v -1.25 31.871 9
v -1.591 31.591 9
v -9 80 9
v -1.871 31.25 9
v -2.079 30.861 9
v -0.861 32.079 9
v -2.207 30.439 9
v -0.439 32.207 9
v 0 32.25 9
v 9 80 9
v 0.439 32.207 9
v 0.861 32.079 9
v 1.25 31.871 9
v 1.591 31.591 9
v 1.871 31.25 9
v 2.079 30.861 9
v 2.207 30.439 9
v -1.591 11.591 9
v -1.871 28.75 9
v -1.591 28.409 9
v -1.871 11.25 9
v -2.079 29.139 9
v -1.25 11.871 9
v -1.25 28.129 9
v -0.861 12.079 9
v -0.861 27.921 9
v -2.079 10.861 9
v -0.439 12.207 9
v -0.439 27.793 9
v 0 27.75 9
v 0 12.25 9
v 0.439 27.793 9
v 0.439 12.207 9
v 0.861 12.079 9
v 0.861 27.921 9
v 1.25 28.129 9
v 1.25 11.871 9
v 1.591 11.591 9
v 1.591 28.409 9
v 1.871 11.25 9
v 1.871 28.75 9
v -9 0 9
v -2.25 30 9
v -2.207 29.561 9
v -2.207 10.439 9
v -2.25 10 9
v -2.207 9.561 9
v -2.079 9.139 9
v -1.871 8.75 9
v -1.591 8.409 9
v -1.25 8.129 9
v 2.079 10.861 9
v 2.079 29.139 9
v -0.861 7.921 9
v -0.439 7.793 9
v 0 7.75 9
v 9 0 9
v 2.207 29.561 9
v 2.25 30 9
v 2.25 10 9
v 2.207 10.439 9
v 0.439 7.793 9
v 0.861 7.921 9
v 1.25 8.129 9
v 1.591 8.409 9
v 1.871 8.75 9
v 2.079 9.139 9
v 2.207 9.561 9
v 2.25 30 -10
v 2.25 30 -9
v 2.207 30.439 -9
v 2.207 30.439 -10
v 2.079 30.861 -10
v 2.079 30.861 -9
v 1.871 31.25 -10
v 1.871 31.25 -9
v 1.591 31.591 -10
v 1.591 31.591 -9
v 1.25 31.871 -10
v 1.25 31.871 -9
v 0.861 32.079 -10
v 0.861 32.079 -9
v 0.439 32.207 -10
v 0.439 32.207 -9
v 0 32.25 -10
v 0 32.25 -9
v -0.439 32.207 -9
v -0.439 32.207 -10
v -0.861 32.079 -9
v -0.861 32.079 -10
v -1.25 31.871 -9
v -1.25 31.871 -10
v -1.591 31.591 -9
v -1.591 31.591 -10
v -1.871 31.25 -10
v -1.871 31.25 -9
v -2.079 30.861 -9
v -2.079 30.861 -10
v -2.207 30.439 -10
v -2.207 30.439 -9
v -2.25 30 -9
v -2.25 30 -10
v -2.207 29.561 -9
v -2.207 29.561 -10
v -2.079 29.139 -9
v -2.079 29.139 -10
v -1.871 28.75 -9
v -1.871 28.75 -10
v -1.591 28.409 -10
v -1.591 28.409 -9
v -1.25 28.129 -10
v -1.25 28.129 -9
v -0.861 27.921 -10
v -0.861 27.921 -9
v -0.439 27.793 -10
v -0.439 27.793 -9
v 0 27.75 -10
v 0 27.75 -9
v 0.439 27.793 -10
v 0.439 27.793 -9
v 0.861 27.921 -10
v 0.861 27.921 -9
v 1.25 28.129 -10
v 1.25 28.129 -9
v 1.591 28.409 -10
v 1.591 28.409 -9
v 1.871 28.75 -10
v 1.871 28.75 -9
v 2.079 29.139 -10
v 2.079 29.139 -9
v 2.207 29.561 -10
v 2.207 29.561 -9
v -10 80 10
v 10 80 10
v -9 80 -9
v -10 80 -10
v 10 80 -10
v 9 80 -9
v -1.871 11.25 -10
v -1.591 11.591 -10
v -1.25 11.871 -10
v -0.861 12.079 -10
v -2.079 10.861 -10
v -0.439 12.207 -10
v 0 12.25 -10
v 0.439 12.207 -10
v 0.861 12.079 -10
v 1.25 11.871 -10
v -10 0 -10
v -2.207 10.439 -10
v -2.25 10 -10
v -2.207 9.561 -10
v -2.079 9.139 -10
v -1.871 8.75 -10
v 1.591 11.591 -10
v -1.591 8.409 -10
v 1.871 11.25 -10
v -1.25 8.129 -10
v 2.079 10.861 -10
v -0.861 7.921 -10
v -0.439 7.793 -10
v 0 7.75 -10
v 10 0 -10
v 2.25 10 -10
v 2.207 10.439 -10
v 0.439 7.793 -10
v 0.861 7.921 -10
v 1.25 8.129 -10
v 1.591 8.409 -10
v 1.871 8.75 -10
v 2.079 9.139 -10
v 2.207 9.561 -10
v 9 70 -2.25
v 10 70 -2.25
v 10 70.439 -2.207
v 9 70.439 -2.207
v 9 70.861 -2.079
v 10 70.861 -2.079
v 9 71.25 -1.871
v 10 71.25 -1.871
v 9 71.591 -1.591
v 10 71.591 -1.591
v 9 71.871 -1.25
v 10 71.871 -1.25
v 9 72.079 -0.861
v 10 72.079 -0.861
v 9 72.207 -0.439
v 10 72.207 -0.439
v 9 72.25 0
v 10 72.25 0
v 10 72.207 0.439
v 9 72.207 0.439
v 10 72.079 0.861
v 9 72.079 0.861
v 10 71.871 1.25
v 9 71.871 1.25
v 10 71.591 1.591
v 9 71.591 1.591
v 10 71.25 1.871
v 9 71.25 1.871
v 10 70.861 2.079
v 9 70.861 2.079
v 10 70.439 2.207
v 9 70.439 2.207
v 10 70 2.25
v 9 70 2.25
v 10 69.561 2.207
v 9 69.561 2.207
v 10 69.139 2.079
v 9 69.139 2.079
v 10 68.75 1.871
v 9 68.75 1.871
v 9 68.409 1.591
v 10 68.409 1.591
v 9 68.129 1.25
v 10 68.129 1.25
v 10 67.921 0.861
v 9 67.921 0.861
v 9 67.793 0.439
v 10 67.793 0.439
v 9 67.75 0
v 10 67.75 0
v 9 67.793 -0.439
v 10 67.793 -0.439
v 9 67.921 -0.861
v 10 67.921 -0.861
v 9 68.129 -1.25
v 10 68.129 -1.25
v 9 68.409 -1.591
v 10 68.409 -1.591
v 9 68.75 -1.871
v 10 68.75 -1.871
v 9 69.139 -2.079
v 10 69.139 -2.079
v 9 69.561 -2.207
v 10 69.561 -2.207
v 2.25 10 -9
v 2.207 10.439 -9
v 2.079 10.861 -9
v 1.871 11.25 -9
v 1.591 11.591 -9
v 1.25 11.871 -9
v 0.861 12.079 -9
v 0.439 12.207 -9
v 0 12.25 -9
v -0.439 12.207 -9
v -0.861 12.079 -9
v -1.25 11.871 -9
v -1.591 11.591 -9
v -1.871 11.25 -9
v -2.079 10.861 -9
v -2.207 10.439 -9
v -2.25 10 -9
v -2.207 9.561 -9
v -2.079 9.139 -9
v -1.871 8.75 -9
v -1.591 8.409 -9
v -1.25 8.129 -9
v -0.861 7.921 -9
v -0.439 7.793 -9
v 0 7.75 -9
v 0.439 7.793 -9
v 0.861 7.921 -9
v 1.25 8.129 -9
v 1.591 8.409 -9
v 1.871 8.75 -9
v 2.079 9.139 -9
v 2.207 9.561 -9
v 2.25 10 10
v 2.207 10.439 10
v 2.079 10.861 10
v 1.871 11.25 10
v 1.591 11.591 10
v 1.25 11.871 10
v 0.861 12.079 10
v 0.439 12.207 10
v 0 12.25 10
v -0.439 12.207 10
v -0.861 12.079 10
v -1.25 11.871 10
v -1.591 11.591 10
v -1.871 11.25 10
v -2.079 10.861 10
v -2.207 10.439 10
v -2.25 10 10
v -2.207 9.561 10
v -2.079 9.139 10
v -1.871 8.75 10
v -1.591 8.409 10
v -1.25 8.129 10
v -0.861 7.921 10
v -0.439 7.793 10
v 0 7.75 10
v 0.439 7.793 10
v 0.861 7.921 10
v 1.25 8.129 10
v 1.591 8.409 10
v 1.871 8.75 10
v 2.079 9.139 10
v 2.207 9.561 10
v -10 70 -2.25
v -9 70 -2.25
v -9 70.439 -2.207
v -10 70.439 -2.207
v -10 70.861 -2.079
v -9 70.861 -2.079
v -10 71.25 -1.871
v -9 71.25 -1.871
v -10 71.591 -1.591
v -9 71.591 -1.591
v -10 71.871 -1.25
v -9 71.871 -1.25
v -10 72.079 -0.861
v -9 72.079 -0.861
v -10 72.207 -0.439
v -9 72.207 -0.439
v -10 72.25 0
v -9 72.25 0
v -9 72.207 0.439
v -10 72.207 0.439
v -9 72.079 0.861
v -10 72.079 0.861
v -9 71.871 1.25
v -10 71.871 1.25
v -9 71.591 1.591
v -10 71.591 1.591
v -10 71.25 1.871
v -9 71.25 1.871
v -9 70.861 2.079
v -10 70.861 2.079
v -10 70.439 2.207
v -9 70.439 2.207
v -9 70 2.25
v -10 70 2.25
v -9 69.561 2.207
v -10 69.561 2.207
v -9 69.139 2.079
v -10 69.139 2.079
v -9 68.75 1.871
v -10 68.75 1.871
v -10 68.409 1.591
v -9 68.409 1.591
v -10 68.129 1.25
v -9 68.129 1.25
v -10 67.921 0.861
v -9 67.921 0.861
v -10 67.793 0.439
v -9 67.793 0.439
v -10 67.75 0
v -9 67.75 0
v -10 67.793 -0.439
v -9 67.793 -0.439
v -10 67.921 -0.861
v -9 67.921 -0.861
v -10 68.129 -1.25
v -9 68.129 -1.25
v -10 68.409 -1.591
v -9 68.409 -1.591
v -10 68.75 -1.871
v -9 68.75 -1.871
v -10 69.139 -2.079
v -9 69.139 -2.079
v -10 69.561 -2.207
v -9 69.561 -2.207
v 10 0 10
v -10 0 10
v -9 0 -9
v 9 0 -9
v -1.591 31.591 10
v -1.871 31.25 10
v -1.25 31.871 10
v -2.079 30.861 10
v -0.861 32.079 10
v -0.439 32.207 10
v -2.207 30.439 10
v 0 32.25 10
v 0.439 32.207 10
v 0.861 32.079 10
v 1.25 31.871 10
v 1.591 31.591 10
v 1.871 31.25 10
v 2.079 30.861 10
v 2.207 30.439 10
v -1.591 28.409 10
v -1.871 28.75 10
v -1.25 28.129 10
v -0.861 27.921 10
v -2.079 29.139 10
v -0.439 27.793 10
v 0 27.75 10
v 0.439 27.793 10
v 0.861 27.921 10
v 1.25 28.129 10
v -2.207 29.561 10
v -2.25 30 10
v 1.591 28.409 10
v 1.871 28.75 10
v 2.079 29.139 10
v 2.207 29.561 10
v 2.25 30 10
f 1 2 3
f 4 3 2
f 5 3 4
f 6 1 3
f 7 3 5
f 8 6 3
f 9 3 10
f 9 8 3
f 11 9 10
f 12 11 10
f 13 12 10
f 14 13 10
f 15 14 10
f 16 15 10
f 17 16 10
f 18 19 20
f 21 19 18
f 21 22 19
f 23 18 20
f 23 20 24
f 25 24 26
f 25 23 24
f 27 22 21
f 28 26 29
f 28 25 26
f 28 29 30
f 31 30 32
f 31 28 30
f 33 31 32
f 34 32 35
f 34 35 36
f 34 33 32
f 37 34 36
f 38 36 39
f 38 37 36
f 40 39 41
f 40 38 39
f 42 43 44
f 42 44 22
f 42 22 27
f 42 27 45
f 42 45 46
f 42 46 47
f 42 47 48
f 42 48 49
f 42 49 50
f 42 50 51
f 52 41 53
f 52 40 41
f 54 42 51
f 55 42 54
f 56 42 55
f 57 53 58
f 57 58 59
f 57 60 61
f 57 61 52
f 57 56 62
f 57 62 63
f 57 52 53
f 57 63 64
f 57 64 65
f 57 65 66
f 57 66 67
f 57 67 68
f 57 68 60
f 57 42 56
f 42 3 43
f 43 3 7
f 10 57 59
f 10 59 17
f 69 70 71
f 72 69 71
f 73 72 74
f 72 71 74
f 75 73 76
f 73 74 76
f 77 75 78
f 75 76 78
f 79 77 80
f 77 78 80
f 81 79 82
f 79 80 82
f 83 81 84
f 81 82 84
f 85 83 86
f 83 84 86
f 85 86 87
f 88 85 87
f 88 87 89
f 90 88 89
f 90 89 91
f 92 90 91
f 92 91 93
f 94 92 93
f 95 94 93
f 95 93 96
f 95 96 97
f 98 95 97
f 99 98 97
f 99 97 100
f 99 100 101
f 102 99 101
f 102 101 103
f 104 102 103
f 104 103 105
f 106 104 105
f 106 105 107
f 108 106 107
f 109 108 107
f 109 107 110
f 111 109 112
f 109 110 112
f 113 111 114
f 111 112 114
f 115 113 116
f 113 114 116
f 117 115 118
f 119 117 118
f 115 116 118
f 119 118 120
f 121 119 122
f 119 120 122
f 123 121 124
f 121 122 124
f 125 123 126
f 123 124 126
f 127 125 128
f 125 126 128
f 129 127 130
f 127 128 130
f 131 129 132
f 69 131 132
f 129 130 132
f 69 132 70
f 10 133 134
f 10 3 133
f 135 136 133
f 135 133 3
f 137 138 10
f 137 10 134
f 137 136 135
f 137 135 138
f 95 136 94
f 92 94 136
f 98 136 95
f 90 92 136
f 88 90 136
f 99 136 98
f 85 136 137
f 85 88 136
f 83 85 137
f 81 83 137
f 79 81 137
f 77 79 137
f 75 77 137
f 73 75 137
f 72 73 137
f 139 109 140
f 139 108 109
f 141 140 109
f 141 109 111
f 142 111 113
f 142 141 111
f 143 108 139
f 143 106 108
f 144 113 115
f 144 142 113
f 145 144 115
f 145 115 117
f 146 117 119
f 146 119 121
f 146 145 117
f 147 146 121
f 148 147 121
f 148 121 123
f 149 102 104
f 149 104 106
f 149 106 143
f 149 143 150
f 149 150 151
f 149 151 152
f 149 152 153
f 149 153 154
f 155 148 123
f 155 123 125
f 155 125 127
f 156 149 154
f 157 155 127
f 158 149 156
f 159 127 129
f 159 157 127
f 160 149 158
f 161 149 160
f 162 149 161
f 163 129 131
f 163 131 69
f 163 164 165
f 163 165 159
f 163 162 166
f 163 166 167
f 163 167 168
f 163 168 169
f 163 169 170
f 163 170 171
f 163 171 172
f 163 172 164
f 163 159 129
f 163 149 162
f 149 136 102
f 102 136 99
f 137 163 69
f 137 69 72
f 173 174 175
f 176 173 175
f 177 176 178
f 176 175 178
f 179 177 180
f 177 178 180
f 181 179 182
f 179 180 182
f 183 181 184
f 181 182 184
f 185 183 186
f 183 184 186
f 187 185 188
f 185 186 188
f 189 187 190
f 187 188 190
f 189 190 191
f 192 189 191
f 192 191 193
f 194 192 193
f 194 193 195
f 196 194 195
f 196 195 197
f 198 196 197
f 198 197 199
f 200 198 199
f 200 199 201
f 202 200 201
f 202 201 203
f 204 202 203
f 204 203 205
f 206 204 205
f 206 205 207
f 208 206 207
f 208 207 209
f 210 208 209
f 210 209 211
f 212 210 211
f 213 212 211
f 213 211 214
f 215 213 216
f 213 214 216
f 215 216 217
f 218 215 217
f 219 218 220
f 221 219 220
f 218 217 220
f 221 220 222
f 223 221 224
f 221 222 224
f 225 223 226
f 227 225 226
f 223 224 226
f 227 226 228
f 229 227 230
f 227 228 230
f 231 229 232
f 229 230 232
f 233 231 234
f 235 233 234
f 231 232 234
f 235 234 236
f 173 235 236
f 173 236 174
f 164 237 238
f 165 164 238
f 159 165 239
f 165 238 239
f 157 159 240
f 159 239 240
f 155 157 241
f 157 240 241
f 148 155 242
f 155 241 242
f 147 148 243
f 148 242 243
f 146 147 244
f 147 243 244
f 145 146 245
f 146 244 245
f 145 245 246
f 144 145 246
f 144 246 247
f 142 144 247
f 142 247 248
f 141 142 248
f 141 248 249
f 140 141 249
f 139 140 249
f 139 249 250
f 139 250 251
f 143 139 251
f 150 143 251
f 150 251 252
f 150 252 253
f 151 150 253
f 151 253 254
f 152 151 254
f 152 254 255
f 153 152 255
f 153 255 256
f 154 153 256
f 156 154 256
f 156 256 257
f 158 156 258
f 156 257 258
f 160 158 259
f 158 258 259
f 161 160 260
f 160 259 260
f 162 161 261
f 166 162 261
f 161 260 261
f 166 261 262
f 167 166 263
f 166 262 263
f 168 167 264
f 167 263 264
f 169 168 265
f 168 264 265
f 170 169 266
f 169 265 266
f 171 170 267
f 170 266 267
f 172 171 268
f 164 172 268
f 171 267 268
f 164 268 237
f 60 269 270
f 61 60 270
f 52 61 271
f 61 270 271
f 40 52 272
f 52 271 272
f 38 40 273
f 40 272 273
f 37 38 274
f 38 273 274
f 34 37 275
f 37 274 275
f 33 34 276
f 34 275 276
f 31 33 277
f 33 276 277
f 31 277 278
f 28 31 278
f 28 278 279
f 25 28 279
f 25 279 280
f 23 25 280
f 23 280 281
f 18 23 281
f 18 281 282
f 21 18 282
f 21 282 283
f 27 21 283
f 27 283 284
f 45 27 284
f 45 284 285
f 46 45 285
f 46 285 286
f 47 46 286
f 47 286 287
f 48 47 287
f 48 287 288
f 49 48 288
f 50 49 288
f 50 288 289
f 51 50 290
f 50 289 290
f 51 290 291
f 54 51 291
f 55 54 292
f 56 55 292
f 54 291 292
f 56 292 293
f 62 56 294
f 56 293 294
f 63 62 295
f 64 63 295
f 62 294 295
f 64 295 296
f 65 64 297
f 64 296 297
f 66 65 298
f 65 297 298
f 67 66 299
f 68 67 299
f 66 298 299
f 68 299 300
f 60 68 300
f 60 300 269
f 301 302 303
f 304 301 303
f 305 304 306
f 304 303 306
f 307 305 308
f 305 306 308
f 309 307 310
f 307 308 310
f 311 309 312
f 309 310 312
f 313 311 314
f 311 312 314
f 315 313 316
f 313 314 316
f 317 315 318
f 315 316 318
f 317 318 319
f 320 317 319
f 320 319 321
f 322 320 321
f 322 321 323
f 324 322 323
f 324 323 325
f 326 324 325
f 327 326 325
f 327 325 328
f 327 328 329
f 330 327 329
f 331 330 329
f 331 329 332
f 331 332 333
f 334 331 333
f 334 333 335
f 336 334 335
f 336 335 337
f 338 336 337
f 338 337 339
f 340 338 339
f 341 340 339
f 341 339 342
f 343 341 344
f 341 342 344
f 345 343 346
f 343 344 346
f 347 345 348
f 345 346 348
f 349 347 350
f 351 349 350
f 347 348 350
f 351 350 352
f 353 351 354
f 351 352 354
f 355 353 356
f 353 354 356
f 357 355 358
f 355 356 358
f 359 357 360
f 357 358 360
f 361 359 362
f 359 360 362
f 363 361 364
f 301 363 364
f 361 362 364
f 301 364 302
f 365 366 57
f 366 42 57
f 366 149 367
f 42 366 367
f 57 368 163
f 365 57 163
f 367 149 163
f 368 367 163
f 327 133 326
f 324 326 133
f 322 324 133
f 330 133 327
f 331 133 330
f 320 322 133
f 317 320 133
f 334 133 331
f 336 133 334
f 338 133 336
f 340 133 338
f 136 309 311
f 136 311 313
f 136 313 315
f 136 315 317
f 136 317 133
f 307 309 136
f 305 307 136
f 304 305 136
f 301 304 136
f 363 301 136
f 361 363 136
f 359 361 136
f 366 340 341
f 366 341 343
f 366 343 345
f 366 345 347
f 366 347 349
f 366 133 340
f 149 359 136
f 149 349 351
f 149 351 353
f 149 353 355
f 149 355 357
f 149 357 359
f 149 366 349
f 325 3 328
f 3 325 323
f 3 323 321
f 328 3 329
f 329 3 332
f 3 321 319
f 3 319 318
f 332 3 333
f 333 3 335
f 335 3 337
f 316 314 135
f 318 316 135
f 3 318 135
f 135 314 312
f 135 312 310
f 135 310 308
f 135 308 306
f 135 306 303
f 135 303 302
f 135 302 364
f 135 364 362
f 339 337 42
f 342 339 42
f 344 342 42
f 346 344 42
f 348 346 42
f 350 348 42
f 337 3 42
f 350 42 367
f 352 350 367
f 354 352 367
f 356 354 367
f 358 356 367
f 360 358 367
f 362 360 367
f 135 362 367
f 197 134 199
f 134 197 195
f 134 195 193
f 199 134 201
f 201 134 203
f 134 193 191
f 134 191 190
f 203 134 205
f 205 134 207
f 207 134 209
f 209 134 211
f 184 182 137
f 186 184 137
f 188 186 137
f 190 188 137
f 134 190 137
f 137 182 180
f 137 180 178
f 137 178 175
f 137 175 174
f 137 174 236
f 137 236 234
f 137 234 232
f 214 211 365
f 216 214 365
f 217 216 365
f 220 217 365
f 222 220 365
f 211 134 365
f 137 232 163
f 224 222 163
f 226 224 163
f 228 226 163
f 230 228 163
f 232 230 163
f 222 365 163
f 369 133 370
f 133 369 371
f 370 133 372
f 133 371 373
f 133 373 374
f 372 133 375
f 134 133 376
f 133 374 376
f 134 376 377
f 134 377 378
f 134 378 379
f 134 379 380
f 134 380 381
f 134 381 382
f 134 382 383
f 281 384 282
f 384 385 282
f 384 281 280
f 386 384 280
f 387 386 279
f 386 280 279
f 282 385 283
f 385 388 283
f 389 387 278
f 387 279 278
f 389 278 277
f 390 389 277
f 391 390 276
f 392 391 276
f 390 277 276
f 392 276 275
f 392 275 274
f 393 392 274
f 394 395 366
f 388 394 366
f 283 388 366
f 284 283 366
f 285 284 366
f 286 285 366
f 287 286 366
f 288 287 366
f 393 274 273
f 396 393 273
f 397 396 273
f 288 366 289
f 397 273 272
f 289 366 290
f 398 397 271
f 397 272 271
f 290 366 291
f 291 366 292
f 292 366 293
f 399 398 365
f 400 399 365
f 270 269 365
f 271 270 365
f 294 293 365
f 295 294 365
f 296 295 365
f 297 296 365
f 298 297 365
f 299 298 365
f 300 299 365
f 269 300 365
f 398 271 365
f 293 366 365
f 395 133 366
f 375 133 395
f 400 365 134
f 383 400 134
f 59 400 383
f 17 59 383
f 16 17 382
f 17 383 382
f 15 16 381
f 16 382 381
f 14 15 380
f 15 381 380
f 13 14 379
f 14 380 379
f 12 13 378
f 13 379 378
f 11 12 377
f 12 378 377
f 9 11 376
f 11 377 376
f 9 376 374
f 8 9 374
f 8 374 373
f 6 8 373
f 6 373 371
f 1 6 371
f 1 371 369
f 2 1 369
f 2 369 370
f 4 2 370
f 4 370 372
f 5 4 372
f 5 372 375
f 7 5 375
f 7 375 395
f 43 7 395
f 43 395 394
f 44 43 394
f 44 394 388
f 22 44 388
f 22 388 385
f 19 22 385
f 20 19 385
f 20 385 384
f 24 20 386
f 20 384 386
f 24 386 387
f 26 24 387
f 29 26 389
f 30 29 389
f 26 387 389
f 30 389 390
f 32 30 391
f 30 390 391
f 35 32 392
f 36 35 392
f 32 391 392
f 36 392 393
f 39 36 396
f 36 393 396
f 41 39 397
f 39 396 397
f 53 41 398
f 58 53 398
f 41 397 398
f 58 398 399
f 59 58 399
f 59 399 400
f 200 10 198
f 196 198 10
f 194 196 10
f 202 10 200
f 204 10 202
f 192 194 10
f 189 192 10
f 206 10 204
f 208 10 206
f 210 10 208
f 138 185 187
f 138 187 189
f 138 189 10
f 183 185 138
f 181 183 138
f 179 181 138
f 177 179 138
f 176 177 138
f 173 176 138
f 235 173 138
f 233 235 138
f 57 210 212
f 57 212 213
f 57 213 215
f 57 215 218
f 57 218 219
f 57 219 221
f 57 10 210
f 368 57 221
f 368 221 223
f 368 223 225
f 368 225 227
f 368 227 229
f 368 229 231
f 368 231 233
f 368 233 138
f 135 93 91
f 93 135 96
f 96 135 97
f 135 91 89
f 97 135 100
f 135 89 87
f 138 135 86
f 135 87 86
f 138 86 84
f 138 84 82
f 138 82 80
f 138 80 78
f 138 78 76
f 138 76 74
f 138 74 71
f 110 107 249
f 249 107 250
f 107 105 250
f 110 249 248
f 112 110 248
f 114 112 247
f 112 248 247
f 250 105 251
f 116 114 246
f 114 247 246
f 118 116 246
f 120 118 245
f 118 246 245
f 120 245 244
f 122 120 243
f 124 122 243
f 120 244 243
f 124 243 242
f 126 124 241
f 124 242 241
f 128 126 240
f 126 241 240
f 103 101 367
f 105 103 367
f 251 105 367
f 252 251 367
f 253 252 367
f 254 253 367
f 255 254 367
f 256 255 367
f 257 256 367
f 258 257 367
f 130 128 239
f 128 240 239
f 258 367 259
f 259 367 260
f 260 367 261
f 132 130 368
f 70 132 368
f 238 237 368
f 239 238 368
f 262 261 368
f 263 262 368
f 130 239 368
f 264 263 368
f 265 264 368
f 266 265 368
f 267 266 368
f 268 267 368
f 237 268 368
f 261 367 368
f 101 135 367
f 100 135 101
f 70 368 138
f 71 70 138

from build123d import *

# Parameters (mm, degrees)
SKETCH1_W           = 20
SKETCH1_H           = 20
SKETCH1_W_2         = 18
SKETCH1_H_2         = 18
BOSS_EXTRUDE1_DEPTH = 80
SKETCH2_R           = 2.25
CUT_EXTRUDE1_DEPTH  = 84.066238629
SKETCH3_R           = 2.25
CUT_EXTRUDE2_DEPTH  = 84.066238629


with BuildPart() as part:
    # Sketch1 → Boss-Extrude1 (new body)
    with BuildSketch(Plane(origin=(0, 0, 0), x_dir=(1, 0, 0), z_dir=(0, 1, 0))):
        Rectangle(SKETCH1_W, SKETCH1_H)
        Rectangle(SKETCH1_W_2, SKETCH1_H_2, mode=Mode.SUBTRACT)
    extrude(amount=BOSS_EXTRUDE1_DEPTH)

    # Sketch2 → Cut-Extrude1 (cut, through all)
    with BuildSketch(Plane.XY.offset(10)):
        with Locations((0, 10)):
            Circle(SKETCH2_R)
        with Locations((0, 30)):
            Circle(SKETCH2_R)
    extrude(amount=-CUT_EXTRUDE1_DEPTH, mode=Mode.SUBTRACT)

    # Sketch3 → Cut-Extrude2 (cut, through all)
    with BuildSketch(Plane(origin=(10, 0, 0), x_dir=(0, 0, -1), z_dir=(1, 0, 0))):
        with Locations((0, 70)):
            Circle(SKETCH3_R)
    extrude(amount=-CUT_EXTRUDE2_DEPTH, mode=Mode.SUBTRACT)


solid = part.part
